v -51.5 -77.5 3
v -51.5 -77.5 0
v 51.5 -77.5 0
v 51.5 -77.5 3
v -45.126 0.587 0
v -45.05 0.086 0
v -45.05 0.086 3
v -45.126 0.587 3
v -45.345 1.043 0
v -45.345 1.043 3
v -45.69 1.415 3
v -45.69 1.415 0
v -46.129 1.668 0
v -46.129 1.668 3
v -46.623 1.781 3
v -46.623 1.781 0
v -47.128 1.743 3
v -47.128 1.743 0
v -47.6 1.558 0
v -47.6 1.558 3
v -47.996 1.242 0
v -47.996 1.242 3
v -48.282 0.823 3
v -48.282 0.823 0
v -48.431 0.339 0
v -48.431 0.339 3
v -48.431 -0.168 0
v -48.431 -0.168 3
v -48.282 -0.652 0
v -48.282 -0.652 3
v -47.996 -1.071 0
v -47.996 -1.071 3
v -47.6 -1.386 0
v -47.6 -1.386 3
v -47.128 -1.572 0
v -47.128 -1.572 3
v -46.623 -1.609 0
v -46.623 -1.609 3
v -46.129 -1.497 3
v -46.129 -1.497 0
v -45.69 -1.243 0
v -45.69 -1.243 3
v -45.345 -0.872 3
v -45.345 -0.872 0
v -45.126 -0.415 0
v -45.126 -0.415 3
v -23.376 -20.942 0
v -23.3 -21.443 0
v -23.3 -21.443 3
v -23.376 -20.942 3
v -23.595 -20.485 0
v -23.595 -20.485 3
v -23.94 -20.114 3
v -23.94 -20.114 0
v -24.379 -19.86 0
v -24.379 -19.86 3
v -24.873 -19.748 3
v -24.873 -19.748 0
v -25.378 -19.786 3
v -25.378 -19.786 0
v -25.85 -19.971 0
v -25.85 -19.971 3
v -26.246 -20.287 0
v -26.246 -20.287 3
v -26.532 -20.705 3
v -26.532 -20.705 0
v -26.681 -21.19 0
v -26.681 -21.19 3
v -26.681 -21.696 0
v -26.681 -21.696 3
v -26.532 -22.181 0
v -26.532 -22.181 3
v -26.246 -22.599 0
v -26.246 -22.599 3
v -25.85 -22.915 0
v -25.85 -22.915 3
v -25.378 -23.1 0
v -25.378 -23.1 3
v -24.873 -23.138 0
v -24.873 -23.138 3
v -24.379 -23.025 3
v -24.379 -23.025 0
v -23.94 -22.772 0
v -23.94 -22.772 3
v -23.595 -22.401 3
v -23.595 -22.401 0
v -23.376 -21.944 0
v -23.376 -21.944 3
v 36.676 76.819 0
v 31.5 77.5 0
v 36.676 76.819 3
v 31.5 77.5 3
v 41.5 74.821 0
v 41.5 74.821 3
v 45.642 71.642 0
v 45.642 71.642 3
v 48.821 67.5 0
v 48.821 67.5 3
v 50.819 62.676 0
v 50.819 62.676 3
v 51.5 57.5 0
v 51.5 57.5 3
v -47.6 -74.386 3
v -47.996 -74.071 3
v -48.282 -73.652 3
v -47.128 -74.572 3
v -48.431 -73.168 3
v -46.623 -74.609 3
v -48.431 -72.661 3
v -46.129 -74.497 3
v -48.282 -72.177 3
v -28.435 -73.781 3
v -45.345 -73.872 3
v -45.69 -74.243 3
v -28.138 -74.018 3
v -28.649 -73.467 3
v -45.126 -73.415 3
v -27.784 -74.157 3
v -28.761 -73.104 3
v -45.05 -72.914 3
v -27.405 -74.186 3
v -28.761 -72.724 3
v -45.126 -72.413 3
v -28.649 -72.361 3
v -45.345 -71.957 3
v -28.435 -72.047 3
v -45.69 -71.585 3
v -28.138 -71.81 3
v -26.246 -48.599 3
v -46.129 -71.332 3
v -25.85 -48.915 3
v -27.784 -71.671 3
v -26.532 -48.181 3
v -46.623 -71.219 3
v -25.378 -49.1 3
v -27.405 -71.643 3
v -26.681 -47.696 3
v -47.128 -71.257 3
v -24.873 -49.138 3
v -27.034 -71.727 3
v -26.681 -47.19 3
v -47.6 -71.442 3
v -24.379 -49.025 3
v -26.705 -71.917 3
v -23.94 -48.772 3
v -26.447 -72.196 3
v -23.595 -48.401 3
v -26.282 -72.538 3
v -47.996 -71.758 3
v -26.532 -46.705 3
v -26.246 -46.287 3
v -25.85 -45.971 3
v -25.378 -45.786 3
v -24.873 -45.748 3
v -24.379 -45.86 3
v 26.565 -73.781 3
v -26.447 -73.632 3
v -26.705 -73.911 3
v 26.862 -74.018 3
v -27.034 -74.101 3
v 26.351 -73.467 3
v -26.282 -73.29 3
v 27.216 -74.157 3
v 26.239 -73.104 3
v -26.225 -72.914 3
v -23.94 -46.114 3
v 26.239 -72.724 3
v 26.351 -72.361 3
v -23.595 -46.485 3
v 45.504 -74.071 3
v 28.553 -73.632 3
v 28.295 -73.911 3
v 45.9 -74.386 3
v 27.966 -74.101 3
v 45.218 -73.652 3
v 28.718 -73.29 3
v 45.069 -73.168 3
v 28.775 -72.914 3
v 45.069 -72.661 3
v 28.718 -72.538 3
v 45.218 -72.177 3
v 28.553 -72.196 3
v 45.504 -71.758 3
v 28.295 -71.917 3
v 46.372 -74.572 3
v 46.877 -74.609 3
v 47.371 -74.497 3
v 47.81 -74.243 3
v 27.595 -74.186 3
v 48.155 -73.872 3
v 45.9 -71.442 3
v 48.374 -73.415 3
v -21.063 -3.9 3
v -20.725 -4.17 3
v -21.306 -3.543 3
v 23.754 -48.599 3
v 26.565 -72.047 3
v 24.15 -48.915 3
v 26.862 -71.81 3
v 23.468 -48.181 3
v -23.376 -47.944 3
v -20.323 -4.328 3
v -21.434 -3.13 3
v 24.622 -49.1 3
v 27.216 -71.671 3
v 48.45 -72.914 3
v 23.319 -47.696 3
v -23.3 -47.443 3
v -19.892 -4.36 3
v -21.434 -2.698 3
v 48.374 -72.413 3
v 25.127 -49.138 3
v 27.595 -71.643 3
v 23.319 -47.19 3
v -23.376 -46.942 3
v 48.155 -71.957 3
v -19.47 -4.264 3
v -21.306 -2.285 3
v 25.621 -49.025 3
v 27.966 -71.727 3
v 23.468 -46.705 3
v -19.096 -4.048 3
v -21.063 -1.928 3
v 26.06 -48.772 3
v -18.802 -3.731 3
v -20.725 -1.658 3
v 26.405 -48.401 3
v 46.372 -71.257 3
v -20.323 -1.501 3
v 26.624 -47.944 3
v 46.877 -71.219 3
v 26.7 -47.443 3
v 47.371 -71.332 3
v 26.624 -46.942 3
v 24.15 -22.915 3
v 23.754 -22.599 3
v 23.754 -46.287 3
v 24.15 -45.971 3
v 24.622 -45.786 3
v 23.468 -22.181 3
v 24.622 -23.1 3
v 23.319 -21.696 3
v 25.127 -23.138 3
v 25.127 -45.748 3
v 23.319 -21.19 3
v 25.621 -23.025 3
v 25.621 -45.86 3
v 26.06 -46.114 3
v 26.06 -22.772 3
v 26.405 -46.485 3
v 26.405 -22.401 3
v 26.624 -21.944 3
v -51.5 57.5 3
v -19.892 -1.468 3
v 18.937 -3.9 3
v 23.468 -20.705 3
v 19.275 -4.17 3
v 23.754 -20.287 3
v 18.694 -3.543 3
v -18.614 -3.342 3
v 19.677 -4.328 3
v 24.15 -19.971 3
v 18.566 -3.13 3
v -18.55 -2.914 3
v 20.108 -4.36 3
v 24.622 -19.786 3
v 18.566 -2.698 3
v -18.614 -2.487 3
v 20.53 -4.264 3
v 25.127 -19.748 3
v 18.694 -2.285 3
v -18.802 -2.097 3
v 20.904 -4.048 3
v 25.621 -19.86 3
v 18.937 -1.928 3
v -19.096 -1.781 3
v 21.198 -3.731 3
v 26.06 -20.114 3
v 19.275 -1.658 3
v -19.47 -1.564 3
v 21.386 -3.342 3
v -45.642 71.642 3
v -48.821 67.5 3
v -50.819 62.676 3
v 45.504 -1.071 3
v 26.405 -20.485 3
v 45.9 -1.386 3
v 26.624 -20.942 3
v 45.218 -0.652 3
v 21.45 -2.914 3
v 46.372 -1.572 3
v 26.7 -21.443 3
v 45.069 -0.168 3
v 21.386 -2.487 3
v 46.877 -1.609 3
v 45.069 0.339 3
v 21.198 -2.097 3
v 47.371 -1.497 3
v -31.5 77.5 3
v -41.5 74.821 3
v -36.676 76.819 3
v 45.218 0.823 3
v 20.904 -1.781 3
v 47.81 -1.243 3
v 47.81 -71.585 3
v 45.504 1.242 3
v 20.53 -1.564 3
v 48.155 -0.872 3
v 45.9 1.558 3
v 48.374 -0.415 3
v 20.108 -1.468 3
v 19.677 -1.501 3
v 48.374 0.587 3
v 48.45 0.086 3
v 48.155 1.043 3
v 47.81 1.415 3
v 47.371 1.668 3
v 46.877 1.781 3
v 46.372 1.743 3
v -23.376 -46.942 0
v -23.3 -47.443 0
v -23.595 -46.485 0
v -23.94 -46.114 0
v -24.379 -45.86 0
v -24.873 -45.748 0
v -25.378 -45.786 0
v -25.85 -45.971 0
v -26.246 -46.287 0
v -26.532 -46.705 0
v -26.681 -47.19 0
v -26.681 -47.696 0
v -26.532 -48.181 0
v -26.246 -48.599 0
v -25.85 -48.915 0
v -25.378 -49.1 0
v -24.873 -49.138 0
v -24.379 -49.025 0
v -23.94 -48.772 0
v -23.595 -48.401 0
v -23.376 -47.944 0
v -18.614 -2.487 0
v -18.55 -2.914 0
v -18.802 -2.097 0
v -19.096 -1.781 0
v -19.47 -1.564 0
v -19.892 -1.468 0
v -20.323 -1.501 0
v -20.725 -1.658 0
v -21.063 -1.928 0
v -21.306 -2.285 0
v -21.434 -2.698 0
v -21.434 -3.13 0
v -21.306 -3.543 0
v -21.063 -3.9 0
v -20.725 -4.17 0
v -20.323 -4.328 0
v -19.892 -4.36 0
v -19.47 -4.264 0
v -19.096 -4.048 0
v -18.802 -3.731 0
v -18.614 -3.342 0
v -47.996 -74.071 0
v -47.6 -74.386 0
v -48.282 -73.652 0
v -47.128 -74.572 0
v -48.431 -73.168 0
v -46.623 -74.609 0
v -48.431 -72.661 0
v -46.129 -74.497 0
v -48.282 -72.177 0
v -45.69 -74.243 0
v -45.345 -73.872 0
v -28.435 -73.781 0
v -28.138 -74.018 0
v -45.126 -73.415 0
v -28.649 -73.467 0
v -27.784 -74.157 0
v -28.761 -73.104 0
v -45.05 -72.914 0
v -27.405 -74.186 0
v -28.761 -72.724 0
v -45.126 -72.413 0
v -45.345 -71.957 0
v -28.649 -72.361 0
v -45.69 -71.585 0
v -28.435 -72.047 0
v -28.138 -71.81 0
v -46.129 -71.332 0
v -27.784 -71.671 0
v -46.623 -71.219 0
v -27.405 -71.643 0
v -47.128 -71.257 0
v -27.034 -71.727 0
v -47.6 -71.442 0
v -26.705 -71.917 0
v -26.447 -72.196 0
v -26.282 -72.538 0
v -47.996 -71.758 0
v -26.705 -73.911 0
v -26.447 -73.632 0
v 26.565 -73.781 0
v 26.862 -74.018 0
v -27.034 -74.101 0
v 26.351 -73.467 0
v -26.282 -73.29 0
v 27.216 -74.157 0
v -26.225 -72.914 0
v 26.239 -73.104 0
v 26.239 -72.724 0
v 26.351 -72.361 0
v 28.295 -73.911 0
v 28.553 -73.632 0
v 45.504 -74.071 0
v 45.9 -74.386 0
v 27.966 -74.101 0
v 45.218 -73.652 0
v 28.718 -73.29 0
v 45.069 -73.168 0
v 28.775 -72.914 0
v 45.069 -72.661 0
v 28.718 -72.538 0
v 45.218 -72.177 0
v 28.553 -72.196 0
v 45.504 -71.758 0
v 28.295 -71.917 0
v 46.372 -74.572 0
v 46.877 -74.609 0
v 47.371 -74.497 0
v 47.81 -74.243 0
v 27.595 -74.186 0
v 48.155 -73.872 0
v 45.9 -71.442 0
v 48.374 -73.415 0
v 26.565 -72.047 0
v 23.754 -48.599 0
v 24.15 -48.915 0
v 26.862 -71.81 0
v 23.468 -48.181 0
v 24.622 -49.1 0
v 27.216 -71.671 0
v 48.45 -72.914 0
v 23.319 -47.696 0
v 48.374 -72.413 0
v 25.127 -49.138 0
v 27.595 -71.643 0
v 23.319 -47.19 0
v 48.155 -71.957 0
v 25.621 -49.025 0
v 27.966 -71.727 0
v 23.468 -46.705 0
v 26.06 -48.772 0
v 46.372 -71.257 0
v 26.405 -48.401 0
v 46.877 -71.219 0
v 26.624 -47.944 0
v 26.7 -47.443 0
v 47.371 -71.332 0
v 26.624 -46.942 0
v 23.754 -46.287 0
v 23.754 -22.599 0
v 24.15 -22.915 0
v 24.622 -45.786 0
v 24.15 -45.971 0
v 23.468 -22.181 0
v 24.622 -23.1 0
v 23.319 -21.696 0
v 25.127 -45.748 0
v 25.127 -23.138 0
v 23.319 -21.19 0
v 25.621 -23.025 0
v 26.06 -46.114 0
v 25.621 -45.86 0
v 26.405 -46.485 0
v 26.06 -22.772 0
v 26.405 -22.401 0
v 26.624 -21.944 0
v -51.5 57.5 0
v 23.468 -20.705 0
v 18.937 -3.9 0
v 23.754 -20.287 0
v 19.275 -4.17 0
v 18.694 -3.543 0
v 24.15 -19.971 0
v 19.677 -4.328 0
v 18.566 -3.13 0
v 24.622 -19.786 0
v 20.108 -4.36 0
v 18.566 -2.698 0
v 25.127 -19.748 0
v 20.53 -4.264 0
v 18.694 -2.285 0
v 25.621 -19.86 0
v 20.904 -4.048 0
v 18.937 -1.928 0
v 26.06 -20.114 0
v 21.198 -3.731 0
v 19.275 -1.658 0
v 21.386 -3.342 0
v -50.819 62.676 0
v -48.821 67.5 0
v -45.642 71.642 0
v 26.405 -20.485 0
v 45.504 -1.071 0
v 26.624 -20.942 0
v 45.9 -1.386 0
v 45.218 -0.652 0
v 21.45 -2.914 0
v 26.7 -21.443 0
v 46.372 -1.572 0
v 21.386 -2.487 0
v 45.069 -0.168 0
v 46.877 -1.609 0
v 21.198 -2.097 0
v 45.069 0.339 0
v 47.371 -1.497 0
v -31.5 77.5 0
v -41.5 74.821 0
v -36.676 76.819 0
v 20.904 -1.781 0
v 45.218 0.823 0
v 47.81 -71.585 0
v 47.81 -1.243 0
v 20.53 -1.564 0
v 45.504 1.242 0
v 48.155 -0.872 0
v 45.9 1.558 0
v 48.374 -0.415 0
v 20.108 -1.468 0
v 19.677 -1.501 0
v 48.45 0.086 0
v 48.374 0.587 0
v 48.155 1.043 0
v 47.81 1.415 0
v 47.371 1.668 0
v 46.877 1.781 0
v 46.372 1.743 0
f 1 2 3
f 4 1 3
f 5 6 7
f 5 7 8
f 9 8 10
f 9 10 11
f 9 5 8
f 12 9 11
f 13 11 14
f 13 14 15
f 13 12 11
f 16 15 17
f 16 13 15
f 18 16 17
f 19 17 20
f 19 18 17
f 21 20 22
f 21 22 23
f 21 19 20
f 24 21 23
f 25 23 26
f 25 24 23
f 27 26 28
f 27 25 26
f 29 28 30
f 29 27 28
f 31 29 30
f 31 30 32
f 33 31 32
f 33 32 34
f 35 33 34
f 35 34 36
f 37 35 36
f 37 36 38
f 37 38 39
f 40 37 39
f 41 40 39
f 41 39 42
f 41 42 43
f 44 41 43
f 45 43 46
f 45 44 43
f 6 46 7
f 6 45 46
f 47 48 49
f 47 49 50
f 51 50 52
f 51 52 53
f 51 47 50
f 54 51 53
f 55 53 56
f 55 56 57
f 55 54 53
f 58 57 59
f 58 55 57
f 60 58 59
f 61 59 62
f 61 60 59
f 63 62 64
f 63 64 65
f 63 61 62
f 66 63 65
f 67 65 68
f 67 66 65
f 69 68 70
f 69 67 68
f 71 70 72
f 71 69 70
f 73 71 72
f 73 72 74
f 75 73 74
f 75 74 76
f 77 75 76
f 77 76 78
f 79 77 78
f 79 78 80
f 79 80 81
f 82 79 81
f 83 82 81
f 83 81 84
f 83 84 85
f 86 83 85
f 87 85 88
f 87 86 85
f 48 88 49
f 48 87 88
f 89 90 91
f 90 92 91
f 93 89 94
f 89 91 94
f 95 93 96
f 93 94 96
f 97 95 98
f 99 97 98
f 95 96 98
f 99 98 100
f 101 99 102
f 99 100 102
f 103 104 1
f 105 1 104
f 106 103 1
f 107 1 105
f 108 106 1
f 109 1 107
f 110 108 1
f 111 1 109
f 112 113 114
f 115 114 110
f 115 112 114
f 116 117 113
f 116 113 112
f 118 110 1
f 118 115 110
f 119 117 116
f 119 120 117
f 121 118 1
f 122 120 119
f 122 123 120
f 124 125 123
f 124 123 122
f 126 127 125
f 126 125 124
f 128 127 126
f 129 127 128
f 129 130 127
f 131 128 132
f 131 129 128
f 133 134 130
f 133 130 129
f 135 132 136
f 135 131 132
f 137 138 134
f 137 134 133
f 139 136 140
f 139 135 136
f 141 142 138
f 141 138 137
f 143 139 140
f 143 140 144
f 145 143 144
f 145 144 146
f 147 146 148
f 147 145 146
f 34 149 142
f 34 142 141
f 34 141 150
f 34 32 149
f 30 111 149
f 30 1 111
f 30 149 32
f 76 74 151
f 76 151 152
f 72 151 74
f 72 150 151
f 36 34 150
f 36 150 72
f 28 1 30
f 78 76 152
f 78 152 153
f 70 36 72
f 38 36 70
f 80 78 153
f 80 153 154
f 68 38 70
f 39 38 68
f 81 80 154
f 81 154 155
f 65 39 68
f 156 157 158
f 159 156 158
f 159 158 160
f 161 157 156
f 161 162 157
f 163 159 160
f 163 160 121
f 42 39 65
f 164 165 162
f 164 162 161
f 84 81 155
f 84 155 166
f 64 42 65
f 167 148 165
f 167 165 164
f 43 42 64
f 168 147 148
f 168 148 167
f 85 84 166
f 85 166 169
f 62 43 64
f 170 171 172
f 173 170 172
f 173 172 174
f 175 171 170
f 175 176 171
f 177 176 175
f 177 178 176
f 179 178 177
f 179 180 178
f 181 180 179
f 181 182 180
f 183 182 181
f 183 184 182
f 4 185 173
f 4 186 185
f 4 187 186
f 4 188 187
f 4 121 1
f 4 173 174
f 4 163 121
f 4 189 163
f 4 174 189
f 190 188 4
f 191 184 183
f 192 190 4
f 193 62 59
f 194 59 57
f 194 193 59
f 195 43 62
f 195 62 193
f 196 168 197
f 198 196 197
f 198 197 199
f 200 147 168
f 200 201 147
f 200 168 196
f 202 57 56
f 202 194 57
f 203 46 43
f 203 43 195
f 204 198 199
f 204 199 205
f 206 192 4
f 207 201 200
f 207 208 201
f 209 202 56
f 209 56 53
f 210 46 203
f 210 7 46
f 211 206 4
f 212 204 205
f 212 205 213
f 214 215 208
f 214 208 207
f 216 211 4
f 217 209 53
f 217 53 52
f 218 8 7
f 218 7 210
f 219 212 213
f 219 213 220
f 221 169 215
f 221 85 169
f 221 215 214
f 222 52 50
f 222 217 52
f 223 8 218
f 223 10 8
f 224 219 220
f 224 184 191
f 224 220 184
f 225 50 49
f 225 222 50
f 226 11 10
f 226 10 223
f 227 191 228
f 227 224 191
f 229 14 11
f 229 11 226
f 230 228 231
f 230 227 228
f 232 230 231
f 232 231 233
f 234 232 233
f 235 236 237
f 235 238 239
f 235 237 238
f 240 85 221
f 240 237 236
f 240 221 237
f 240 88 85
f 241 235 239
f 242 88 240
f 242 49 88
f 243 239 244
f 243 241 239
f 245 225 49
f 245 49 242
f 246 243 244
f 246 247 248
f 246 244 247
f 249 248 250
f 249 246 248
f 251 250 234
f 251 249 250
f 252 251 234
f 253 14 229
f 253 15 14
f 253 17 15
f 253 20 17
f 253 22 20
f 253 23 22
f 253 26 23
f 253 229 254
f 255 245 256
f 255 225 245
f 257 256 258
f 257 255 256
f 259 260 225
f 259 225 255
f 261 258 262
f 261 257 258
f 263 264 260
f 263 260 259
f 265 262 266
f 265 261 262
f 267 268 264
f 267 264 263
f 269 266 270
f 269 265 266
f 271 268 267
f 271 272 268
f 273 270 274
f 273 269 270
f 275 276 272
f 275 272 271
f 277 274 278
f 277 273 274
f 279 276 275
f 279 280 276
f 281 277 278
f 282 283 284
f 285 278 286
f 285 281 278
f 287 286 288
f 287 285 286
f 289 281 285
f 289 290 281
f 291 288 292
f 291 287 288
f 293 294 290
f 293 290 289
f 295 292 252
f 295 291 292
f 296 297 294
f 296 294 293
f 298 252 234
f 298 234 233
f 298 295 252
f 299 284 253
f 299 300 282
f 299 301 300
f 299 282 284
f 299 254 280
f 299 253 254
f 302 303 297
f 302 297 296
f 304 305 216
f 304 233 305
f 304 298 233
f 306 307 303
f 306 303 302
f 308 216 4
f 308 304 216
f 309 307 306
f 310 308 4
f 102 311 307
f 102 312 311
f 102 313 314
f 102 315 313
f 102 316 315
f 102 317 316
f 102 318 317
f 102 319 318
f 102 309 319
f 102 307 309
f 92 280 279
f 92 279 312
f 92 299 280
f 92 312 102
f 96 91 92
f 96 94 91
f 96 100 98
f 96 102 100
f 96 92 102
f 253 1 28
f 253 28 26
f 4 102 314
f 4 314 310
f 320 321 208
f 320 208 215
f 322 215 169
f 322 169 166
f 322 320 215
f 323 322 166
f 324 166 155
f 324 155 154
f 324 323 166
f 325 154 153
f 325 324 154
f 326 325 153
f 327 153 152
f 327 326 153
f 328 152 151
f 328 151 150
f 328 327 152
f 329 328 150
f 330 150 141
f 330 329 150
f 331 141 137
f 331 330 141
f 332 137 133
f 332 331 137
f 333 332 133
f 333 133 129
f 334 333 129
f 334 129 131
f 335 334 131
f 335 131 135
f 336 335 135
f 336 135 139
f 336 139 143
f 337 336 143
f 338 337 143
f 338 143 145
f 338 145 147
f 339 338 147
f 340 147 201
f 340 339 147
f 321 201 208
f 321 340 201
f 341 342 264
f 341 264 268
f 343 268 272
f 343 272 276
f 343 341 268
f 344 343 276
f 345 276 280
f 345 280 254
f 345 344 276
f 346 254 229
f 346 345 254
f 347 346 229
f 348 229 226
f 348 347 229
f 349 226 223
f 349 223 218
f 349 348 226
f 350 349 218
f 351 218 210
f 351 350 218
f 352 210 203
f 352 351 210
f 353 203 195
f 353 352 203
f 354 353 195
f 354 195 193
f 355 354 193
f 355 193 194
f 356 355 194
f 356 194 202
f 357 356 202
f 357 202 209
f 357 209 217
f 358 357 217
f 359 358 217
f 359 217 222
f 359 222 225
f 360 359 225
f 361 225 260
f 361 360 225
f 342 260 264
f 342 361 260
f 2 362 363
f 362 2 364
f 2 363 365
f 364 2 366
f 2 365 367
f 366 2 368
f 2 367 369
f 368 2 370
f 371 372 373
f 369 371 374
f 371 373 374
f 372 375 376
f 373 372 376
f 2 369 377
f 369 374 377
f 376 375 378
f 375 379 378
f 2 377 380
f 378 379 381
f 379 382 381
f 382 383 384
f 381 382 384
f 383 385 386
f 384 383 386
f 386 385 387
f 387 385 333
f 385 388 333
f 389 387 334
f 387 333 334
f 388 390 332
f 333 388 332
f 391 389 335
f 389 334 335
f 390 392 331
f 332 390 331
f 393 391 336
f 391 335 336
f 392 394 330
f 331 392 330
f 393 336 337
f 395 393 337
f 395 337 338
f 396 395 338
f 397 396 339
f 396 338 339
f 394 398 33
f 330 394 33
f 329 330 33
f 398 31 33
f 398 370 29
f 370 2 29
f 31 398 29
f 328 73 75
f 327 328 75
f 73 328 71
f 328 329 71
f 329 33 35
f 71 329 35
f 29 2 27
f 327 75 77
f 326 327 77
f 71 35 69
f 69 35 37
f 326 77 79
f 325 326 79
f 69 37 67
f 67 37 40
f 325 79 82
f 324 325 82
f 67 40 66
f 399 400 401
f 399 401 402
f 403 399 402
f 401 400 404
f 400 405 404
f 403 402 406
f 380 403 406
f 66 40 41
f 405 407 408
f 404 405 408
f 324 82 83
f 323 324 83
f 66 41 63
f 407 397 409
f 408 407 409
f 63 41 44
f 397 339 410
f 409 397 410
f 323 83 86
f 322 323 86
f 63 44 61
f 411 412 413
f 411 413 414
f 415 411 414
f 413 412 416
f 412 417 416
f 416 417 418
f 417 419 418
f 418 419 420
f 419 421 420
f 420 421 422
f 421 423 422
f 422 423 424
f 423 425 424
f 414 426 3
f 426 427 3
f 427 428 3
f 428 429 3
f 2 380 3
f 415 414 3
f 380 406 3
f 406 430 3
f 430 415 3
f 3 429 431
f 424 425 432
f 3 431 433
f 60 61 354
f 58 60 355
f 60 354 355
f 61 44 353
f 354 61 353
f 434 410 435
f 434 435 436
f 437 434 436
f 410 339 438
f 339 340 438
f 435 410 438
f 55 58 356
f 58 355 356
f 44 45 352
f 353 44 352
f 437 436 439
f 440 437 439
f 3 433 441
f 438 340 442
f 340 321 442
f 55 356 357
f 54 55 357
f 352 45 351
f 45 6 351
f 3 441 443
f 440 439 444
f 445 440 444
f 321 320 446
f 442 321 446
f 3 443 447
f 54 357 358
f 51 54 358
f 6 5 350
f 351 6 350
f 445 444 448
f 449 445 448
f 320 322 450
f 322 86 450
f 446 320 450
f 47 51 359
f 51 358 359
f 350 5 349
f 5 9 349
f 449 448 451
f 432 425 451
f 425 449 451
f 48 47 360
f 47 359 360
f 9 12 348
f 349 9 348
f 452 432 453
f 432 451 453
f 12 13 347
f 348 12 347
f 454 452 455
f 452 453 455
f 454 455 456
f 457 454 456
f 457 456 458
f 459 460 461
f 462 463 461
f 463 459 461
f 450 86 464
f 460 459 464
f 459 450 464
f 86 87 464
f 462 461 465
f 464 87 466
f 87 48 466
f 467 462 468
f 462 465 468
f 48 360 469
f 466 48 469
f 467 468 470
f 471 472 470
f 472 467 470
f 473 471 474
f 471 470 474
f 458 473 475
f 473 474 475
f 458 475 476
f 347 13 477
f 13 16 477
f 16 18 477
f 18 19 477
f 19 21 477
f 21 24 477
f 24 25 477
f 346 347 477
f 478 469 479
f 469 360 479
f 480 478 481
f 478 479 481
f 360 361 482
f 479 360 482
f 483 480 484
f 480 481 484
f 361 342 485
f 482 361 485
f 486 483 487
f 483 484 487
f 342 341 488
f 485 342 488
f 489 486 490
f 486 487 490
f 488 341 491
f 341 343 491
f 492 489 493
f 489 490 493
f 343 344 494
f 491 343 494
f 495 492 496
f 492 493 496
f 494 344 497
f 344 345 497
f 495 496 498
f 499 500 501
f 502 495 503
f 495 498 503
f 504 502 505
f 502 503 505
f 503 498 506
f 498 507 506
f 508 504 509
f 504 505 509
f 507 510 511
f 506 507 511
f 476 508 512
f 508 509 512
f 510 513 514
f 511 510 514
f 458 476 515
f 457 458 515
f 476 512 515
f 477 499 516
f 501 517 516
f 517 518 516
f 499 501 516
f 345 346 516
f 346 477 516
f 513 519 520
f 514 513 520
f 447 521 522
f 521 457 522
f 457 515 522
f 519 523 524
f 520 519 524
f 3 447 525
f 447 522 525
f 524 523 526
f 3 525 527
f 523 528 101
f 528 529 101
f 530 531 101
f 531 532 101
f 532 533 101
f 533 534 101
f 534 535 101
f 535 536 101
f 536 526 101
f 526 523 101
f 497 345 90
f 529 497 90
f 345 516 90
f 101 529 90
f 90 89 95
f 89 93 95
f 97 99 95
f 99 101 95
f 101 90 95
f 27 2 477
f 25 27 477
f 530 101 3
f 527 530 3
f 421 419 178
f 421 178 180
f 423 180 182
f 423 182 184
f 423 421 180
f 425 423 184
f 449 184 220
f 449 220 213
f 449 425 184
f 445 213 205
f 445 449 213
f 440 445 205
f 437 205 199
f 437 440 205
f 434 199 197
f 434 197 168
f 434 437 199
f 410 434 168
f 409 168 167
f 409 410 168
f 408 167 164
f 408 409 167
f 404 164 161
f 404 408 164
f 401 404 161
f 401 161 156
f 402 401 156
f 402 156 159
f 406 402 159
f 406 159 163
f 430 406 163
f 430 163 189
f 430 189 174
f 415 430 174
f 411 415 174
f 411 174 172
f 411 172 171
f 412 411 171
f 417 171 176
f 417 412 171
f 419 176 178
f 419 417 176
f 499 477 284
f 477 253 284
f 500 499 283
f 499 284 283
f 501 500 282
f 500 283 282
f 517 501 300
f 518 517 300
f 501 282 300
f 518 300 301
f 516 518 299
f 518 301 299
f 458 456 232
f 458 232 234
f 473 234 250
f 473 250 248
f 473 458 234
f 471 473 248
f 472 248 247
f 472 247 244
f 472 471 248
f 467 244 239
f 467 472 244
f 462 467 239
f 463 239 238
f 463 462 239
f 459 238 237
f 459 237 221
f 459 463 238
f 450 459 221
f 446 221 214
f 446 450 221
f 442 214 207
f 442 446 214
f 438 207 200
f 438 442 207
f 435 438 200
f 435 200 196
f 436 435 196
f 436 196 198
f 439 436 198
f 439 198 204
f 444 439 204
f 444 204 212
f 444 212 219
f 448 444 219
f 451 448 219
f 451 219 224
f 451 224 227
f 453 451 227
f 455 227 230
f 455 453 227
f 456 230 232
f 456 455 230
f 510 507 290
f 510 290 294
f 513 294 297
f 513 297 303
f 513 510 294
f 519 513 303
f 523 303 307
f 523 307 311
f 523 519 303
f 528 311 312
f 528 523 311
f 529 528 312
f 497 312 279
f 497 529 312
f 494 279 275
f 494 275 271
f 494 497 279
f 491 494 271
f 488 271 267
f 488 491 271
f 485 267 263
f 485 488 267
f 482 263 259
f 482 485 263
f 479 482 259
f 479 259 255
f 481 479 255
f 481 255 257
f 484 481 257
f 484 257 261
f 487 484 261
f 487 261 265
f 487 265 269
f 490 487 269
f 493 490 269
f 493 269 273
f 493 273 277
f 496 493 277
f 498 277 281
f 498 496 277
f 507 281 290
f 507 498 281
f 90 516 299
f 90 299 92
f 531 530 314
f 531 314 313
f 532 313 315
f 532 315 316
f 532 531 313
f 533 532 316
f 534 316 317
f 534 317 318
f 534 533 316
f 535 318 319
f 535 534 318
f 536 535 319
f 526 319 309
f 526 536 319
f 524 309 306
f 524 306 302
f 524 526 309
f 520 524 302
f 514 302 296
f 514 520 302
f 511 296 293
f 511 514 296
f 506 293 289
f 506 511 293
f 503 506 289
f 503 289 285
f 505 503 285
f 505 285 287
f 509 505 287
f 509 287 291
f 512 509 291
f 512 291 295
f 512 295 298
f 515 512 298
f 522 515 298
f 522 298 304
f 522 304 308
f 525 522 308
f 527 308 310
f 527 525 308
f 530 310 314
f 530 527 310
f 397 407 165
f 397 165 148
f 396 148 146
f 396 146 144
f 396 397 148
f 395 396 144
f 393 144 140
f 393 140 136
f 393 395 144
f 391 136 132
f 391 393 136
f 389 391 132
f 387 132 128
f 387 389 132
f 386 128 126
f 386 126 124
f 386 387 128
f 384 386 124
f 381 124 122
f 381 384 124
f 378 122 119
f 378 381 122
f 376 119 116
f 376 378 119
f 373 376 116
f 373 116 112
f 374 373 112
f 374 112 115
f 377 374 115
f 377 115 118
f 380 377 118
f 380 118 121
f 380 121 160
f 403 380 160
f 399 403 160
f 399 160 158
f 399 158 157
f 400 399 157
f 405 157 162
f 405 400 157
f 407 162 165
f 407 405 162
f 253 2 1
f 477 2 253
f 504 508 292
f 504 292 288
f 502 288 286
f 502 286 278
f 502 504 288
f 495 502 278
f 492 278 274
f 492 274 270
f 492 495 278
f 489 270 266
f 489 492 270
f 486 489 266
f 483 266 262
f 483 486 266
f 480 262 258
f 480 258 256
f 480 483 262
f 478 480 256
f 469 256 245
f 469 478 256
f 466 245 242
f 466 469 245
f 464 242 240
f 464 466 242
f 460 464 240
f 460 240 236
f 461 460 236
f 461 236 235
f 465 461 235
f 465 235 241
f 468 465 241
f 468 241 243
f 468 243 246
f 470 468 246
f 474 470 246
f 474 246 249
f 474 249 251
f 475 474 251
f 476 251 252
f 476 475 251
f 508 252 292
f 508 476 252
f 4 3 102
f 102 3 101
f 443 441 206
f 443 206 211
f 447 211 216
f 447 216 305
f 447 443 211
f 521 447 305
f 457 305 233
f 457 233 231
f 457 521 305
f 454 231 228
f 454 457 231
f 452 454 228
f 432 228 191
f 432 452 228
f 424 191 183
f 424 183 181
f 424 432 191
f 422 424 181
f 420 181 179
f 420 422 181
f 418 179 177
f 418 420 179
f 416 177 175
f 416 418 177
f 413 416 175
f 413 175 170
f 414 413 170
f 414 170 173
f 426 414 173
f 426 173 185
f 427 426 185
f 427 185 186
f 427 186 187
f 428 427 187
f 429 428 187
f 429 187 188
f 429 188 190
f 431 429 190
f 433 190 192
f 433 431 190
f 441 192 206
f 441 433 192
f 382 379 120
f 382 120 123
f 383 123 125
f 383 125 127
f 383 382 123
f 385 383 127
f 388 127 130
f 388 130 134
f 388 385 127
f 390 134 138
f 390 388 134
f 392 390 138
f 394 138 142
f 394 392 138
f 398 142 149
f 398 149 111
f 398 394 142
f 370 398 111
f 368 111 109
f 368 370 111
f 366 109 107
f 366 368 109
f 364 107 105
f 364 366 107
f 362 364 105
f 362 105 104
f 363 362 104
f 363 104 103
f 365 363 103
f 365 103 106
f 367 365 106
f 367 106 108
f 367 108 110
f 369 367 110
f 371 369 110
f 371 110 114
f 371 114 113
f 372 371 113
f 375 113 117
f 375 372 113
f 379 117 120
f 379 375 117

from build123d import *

# Parameters (mm, degrees)
SKETCH_W   = 103
SKETCH_H   = 155
SKETCH_R   = 1.275
SKETCH_R_2 = 1.45
SKETCH_R_3 = 1.7
PAD_DEPTH  = 3
FILLET_R   = 20


with BuildPart() as part:
    # Sketch → Pad (new body)
    with BuildSketch(Plane.XY):
        Rectangle(SKETCH_W, SKETCH_H)
        with Locations((-27.5, -72.91422)):
            Circle(SKETCH_R, mode=Mode.SUBTRACT)
        with Locations((27.5, -72.91422)):
            Circle(SKETCH_R, mode=Mode.SUBTRACT)
        with Locations((-20, -2.91422)):
            Circle(SKETCH_R_2, mode=Mode.SUBTRACT)
        with Locations((20, -2.91422)):
            Circle(SKETCH_R_2, mode=Mode.SUBTRACT)
        with Locations((-46.75, 0.08578)):
            Circle(SKETCH_R_3, mode=Mode.SUBTRACT)
        with Locations((-46.75, -72.91422)):
            Circle(SKETCH_R_3, mode=Mode.SUBTRACT)
        with Locations((46.75, -72.91422)):
            Circle(SKETCH_R_3, mode=Mode.SUBTRACT)
        with Locations((46.75, 0.08578)):
            Circle(SKETCH_R_3, mode=Mode.SUBTRACT)
        with Locations((-25, -21.442924)):
            Circle(SKETCH_R_3, mode=Mode.SUBTRACT)
        with Locations((-25, -47.442924)):
            Circle(SKETCH_R_3, mode=Mode.SUBTRACT)
        with Locations((25, -21.442924)):
            Circle(SKETCH_R_3, mode=Mode.SUBTRACT)
        with Locations((25, -47.442924)):
            Circle(SKETCH_R_3, mode=Mode.SUBTRACT)
    extrude(amount=PAD_DEPTH)

    # Fillet
    fillet_edges = [part.edges().sort_by_distance(p)[0] for p in [
        (-51.5, 77.5, 1.5),
        (51.5, 77.5, 1.5),
    ]]
    fillet(fillet_edges, radius=FILLET_R)


solid = part.part
